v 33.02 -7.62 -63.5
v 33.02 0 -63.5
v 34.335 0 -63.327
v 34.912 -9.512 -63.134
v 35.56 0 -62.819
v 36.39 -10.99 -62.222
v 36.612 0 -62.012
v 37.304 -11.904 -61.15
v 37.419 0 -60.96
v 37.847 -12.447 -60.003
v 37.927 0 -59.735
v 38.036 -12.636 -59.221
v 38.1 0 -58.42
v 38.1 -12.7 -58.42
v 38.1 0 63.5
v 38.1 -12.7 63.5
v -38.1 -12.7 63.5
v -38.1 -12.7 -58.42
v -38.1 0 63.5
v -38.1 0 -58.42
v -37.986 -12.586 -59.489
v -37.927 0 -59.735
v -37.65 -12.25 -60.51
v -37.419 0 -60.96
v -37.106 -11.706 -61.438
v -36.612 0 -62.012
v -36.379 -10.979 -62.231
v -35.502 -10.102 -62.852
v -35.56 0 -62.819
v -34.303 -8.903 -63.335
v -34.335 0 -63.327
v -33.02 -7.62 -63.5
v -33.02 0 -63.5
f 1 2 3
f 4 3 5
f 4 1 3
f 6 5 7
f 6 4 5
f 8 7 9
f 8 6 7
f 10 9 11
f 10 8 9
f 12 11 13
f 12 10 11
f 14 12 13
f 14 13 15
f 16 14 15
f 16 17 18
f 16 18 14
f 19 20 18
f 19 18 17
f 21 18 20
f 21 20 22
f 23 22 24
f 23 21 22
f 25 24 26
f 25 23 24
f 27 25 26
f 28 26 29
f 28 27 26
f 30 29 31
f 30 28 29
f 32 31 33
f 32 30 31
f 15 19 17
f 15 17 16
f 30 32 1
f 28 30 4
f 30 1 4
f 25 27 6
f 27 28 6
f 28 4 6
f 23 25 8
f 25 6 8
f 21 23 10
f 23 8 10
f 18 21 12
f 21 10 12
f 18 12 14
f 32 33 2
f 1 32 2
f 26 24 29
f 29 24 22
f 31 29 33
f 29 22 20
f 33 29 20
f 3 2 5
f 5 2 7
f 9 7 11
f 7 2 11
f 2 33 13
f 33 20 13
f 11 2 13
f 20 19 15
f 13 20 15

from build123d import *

# Parameters (mm, degrees)
F0_W     = 76.2
F0_H     = 127
F1_DEPTH = 12.7
F2_R     = 5.08


with BuildPart() as f1:
    # F0 (on Front) → F1 (new body)
    with BuildSketch(Plane.XZ):
        Rectangle(F0_W, F0_H)
    extrude(amount=F1_DEPTH)

    # F2
    f2_edges = [f1.edges().sort_by_distance(p)[0] for p in [
        (38.1, -6.35, -63.5),
        (-38.1, -6.35, -63.5),
        (0, -12.7, -63.5),
    ]]
    fillet(f2_edges, radius=F2_R)


solid = f1.part
